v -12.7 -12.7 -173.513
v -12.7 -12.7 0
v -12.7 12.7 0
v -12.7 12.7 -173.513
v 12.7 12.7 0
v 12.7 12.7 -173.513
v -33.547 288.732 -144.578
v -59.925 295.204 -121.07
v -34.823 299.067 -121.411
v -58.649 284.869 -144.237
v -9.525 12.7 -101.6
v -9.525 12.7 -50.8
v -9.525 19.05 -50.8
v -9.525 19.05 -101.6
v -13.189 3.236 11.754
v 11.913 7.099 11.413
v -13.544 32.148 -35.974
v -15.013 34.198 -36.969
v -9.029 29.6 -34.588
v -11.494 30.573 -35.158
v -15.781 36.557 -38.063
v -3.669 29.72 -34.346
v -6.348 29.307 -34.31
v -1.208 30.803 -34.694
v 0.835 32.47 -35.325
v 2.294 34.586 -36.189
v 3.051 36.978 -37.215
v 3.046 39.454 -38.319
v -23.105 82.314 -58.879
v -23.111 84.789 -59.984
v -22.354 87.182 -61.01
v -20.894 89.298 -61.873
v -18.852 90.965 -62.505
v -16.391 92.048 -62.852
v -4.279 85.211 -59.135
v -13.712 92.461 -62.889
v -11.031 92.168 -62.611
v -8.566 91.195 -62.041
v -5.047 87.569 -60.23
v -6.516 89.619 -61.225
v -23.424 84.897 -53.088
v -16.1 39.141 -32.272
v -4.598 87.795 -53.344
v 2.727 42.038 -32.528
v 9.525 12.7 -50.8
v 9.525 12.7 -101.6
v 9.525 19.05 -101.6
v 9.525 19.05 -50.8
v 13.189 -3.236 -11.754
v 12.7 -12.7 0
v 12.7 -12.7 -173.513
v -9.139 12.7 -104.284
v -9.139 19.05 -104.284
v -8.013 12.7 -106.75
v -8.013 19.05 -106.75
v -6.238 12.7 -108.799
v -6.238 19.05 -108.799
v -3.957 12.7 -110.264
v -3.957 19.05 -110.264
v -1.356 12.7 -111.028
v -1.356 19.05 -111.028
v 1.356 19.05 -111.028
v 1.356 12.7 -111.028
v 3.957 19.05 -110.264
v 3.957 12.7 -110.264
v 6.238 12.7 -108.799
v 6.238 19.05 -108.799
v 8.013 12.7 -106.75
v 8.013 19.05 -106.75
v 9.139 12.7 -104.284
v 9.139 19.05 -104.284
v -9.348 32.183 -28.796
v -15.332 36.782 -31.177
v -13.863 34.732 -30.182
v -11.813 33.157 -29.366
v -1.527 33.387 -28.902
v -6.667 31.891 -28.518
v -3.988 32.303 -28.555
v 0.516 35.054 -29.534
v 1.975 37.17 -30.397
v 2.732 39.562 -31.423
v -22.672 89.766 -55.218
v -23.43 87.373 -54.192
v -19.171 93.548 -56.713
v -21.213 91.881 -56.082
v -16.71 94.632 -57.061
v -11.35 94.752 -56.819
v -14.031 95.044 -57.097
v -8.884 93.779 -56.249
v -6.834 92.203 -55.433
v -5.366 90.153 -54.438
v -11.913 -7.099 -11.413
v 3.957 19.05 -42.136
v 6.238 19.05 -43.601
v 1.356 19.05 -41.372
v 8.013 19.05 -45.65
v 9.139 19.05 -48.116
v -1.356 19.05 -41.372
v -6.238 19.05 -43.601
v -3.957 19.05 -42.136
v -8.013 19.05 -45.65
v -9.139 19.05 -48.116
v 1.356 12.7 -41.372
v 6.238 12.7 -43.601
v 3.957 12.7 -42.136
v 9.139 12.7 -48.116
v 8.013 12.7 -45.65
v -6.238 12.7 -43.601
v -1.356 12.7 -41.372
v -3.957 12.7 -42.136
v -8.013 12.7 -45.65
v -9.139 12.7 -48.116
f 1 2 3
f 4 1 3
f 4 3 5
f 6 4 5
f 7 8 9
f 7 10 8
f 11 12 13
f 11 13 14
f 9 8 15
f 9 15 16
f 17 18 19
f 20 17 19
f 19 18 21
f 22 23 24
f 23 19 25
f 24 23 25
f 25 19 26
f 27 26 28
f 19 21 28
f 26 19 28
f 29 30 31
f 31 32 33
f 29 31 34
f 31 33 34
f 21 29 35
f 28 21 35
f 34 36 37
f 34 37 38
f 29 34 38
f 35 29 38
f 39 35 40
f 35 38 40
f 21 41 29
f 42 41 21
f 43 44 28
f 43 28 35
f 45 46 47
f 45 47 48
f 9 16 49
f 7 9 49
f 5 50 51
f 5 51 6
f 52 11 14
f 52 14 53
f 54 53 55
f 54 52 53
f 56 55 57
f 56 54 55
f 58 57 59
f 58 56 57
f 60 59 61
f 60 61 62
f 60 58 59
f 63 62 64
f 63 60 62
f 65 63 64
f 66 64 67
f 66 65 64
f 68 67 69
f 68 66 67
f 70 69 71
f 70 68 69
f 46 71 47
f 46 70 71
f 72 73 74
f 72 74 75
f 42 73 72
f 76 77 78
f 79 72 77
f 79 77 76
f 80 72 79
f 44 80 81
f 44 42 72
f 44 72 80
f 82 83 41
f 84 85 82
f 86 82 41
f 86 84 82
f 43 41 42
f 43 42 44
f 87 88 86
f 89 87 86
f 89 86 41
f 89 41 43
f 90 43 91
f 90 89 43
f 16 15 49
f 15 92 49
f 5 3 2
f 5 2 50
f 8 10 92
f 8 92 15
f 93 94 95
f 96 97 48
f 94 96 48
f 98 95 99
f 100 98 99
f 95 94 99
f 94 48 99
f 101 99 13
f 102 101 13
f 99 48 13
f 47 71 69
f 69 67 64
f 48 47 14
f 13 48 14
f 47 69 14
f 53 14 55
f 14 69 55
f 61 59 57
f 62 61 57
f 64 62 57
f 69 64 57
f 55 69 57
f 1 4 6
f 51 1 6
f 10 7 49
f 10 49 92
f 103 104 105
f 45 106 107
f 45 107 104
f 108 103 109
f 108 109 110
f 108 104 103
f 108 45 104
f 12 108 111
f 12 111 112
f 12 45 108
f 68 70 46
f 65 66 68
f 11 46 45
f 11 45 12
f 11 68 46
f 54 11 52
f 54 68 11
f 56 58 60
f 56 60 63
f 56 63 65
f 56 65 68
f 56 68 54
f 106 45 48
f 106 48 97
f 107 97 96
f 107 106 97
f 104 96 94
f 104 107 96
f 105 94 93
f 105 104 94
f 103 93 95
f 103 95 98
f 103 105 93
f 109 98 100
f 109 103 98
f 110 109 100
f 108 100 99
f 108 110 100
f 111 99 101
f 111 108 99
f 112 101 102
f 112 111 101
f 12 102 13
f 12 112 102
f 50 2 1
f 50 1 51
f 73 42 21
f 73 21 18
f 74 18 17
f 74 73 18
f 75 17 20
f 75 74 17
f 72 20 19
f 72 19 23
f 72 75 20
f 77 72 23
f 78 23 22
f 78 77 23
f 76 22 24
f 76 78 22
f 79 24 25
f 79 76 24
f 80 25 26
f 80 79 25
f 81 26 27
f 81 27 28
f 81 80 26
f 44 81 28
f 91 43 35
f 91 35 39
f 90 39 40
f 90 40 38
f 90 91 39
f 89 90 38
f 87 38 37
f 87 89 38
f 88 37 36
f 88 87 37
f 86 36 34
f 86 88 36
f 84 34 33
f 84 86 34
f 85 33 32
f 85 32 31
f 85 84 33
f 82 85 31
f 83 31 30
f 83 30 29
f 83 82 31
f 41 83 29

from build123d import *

# Parameters (mm, degrees)
SKETCH1_W           = 25.4
SKETCH1_H           = 25.4
BOSS_EXTRUDE1_DEPTH = 173.513484
BOSS_EXTRUDE2_DEPTH = 324.147601
BOSS_EXTRUDE3_DEPTH = 6.35
BOSS_EXTRUDE4_DEPTH = 6.35


with BuildPart() as part:
    # Sketch1 → Boss-Extrude1 (new body)
    with BuildSketch(Plane.XY):
        Rectangle(SKETCH1_W, SKETCH1_H)
    extrude(amount=-BOSS_EXTRUDE1_DEPTH)


with BuildPart() as body_2:
    # Sketch2 → Boss-Extrude2 (new body)
    with BuildSketch(Plane(origin=(0, 0, 0), x_dir=(0.9833973165172839, 0.08431330932106285, -0.16068909028909165), z_dir=(-0.1441814720332392, 0.9007248773125119, -0.40976383260689164))):
        Polygon((-14.585880515, -10.480080611), (10.480080611, -14.585880515), (14.585880515, 10.480080611), (-10.480080611, 14.585880515), align=None)
    extrude(amount=BOSS_EXTRUDE2_DEPTH)


with BuildPart() as body_3:
    # Sketch3 → Boss-Extrude3 (new body)
    with BuildSketch(Plane(origin=(0.637830783, -5.167580224, -11.583578312), x_dir=(0.9987379660310203, 0.020798404327615726, 0.045715441435535804), z_dir=(-0.050222896296522594, 0.40689608064106725, 0.9120927805034567))):
        with BuildLine():
            Line((-24.055967576, 99.169531858), (-16.740848632, 48.898973528))
            ThreePointArc((-16.740848632, 48.898973528), (-5.943534143, 40.844828643), (2.110610742, 51.642143132))
            Line((2.110610742, 51.642143132), (-5.204508203, 101.912701462))
            ThreePointArc((-5.204508203, 101.912701462), (-16.001822692, 109.966846347), (-24.055967576, 99.169531858))
        make_face()
    extrude(amount=-BOSS_EXTRUDE3_DEPTH)


with BuildPart() as body_4:
    # Sketch4 → Boss-Extrude4 (new body)
    with BuildSketch(Plane(origin=(0, 12.7, 0), x_dir=(-1, 0, 0), z_dir=(0, -1, 0))):
        with BuildLine():
            Line((-9.525, 101.6), (-9.525, 50.8))
            ThreePointArc((-9.525, 50.8), (0, 41.275), (9.525, 50.8))
            Line((9.525, 50.8), (9.525, 101.6))
            ThreePointArc((9.525, 101.6), (0, 111.125), (-9.525, 101.6))
        make_face()
    extrude(amount=-BOSS_EXTRUDE4_DEPTH)


solid = Compound([part.part, body_2.part, body_3.part, body_4.part])
